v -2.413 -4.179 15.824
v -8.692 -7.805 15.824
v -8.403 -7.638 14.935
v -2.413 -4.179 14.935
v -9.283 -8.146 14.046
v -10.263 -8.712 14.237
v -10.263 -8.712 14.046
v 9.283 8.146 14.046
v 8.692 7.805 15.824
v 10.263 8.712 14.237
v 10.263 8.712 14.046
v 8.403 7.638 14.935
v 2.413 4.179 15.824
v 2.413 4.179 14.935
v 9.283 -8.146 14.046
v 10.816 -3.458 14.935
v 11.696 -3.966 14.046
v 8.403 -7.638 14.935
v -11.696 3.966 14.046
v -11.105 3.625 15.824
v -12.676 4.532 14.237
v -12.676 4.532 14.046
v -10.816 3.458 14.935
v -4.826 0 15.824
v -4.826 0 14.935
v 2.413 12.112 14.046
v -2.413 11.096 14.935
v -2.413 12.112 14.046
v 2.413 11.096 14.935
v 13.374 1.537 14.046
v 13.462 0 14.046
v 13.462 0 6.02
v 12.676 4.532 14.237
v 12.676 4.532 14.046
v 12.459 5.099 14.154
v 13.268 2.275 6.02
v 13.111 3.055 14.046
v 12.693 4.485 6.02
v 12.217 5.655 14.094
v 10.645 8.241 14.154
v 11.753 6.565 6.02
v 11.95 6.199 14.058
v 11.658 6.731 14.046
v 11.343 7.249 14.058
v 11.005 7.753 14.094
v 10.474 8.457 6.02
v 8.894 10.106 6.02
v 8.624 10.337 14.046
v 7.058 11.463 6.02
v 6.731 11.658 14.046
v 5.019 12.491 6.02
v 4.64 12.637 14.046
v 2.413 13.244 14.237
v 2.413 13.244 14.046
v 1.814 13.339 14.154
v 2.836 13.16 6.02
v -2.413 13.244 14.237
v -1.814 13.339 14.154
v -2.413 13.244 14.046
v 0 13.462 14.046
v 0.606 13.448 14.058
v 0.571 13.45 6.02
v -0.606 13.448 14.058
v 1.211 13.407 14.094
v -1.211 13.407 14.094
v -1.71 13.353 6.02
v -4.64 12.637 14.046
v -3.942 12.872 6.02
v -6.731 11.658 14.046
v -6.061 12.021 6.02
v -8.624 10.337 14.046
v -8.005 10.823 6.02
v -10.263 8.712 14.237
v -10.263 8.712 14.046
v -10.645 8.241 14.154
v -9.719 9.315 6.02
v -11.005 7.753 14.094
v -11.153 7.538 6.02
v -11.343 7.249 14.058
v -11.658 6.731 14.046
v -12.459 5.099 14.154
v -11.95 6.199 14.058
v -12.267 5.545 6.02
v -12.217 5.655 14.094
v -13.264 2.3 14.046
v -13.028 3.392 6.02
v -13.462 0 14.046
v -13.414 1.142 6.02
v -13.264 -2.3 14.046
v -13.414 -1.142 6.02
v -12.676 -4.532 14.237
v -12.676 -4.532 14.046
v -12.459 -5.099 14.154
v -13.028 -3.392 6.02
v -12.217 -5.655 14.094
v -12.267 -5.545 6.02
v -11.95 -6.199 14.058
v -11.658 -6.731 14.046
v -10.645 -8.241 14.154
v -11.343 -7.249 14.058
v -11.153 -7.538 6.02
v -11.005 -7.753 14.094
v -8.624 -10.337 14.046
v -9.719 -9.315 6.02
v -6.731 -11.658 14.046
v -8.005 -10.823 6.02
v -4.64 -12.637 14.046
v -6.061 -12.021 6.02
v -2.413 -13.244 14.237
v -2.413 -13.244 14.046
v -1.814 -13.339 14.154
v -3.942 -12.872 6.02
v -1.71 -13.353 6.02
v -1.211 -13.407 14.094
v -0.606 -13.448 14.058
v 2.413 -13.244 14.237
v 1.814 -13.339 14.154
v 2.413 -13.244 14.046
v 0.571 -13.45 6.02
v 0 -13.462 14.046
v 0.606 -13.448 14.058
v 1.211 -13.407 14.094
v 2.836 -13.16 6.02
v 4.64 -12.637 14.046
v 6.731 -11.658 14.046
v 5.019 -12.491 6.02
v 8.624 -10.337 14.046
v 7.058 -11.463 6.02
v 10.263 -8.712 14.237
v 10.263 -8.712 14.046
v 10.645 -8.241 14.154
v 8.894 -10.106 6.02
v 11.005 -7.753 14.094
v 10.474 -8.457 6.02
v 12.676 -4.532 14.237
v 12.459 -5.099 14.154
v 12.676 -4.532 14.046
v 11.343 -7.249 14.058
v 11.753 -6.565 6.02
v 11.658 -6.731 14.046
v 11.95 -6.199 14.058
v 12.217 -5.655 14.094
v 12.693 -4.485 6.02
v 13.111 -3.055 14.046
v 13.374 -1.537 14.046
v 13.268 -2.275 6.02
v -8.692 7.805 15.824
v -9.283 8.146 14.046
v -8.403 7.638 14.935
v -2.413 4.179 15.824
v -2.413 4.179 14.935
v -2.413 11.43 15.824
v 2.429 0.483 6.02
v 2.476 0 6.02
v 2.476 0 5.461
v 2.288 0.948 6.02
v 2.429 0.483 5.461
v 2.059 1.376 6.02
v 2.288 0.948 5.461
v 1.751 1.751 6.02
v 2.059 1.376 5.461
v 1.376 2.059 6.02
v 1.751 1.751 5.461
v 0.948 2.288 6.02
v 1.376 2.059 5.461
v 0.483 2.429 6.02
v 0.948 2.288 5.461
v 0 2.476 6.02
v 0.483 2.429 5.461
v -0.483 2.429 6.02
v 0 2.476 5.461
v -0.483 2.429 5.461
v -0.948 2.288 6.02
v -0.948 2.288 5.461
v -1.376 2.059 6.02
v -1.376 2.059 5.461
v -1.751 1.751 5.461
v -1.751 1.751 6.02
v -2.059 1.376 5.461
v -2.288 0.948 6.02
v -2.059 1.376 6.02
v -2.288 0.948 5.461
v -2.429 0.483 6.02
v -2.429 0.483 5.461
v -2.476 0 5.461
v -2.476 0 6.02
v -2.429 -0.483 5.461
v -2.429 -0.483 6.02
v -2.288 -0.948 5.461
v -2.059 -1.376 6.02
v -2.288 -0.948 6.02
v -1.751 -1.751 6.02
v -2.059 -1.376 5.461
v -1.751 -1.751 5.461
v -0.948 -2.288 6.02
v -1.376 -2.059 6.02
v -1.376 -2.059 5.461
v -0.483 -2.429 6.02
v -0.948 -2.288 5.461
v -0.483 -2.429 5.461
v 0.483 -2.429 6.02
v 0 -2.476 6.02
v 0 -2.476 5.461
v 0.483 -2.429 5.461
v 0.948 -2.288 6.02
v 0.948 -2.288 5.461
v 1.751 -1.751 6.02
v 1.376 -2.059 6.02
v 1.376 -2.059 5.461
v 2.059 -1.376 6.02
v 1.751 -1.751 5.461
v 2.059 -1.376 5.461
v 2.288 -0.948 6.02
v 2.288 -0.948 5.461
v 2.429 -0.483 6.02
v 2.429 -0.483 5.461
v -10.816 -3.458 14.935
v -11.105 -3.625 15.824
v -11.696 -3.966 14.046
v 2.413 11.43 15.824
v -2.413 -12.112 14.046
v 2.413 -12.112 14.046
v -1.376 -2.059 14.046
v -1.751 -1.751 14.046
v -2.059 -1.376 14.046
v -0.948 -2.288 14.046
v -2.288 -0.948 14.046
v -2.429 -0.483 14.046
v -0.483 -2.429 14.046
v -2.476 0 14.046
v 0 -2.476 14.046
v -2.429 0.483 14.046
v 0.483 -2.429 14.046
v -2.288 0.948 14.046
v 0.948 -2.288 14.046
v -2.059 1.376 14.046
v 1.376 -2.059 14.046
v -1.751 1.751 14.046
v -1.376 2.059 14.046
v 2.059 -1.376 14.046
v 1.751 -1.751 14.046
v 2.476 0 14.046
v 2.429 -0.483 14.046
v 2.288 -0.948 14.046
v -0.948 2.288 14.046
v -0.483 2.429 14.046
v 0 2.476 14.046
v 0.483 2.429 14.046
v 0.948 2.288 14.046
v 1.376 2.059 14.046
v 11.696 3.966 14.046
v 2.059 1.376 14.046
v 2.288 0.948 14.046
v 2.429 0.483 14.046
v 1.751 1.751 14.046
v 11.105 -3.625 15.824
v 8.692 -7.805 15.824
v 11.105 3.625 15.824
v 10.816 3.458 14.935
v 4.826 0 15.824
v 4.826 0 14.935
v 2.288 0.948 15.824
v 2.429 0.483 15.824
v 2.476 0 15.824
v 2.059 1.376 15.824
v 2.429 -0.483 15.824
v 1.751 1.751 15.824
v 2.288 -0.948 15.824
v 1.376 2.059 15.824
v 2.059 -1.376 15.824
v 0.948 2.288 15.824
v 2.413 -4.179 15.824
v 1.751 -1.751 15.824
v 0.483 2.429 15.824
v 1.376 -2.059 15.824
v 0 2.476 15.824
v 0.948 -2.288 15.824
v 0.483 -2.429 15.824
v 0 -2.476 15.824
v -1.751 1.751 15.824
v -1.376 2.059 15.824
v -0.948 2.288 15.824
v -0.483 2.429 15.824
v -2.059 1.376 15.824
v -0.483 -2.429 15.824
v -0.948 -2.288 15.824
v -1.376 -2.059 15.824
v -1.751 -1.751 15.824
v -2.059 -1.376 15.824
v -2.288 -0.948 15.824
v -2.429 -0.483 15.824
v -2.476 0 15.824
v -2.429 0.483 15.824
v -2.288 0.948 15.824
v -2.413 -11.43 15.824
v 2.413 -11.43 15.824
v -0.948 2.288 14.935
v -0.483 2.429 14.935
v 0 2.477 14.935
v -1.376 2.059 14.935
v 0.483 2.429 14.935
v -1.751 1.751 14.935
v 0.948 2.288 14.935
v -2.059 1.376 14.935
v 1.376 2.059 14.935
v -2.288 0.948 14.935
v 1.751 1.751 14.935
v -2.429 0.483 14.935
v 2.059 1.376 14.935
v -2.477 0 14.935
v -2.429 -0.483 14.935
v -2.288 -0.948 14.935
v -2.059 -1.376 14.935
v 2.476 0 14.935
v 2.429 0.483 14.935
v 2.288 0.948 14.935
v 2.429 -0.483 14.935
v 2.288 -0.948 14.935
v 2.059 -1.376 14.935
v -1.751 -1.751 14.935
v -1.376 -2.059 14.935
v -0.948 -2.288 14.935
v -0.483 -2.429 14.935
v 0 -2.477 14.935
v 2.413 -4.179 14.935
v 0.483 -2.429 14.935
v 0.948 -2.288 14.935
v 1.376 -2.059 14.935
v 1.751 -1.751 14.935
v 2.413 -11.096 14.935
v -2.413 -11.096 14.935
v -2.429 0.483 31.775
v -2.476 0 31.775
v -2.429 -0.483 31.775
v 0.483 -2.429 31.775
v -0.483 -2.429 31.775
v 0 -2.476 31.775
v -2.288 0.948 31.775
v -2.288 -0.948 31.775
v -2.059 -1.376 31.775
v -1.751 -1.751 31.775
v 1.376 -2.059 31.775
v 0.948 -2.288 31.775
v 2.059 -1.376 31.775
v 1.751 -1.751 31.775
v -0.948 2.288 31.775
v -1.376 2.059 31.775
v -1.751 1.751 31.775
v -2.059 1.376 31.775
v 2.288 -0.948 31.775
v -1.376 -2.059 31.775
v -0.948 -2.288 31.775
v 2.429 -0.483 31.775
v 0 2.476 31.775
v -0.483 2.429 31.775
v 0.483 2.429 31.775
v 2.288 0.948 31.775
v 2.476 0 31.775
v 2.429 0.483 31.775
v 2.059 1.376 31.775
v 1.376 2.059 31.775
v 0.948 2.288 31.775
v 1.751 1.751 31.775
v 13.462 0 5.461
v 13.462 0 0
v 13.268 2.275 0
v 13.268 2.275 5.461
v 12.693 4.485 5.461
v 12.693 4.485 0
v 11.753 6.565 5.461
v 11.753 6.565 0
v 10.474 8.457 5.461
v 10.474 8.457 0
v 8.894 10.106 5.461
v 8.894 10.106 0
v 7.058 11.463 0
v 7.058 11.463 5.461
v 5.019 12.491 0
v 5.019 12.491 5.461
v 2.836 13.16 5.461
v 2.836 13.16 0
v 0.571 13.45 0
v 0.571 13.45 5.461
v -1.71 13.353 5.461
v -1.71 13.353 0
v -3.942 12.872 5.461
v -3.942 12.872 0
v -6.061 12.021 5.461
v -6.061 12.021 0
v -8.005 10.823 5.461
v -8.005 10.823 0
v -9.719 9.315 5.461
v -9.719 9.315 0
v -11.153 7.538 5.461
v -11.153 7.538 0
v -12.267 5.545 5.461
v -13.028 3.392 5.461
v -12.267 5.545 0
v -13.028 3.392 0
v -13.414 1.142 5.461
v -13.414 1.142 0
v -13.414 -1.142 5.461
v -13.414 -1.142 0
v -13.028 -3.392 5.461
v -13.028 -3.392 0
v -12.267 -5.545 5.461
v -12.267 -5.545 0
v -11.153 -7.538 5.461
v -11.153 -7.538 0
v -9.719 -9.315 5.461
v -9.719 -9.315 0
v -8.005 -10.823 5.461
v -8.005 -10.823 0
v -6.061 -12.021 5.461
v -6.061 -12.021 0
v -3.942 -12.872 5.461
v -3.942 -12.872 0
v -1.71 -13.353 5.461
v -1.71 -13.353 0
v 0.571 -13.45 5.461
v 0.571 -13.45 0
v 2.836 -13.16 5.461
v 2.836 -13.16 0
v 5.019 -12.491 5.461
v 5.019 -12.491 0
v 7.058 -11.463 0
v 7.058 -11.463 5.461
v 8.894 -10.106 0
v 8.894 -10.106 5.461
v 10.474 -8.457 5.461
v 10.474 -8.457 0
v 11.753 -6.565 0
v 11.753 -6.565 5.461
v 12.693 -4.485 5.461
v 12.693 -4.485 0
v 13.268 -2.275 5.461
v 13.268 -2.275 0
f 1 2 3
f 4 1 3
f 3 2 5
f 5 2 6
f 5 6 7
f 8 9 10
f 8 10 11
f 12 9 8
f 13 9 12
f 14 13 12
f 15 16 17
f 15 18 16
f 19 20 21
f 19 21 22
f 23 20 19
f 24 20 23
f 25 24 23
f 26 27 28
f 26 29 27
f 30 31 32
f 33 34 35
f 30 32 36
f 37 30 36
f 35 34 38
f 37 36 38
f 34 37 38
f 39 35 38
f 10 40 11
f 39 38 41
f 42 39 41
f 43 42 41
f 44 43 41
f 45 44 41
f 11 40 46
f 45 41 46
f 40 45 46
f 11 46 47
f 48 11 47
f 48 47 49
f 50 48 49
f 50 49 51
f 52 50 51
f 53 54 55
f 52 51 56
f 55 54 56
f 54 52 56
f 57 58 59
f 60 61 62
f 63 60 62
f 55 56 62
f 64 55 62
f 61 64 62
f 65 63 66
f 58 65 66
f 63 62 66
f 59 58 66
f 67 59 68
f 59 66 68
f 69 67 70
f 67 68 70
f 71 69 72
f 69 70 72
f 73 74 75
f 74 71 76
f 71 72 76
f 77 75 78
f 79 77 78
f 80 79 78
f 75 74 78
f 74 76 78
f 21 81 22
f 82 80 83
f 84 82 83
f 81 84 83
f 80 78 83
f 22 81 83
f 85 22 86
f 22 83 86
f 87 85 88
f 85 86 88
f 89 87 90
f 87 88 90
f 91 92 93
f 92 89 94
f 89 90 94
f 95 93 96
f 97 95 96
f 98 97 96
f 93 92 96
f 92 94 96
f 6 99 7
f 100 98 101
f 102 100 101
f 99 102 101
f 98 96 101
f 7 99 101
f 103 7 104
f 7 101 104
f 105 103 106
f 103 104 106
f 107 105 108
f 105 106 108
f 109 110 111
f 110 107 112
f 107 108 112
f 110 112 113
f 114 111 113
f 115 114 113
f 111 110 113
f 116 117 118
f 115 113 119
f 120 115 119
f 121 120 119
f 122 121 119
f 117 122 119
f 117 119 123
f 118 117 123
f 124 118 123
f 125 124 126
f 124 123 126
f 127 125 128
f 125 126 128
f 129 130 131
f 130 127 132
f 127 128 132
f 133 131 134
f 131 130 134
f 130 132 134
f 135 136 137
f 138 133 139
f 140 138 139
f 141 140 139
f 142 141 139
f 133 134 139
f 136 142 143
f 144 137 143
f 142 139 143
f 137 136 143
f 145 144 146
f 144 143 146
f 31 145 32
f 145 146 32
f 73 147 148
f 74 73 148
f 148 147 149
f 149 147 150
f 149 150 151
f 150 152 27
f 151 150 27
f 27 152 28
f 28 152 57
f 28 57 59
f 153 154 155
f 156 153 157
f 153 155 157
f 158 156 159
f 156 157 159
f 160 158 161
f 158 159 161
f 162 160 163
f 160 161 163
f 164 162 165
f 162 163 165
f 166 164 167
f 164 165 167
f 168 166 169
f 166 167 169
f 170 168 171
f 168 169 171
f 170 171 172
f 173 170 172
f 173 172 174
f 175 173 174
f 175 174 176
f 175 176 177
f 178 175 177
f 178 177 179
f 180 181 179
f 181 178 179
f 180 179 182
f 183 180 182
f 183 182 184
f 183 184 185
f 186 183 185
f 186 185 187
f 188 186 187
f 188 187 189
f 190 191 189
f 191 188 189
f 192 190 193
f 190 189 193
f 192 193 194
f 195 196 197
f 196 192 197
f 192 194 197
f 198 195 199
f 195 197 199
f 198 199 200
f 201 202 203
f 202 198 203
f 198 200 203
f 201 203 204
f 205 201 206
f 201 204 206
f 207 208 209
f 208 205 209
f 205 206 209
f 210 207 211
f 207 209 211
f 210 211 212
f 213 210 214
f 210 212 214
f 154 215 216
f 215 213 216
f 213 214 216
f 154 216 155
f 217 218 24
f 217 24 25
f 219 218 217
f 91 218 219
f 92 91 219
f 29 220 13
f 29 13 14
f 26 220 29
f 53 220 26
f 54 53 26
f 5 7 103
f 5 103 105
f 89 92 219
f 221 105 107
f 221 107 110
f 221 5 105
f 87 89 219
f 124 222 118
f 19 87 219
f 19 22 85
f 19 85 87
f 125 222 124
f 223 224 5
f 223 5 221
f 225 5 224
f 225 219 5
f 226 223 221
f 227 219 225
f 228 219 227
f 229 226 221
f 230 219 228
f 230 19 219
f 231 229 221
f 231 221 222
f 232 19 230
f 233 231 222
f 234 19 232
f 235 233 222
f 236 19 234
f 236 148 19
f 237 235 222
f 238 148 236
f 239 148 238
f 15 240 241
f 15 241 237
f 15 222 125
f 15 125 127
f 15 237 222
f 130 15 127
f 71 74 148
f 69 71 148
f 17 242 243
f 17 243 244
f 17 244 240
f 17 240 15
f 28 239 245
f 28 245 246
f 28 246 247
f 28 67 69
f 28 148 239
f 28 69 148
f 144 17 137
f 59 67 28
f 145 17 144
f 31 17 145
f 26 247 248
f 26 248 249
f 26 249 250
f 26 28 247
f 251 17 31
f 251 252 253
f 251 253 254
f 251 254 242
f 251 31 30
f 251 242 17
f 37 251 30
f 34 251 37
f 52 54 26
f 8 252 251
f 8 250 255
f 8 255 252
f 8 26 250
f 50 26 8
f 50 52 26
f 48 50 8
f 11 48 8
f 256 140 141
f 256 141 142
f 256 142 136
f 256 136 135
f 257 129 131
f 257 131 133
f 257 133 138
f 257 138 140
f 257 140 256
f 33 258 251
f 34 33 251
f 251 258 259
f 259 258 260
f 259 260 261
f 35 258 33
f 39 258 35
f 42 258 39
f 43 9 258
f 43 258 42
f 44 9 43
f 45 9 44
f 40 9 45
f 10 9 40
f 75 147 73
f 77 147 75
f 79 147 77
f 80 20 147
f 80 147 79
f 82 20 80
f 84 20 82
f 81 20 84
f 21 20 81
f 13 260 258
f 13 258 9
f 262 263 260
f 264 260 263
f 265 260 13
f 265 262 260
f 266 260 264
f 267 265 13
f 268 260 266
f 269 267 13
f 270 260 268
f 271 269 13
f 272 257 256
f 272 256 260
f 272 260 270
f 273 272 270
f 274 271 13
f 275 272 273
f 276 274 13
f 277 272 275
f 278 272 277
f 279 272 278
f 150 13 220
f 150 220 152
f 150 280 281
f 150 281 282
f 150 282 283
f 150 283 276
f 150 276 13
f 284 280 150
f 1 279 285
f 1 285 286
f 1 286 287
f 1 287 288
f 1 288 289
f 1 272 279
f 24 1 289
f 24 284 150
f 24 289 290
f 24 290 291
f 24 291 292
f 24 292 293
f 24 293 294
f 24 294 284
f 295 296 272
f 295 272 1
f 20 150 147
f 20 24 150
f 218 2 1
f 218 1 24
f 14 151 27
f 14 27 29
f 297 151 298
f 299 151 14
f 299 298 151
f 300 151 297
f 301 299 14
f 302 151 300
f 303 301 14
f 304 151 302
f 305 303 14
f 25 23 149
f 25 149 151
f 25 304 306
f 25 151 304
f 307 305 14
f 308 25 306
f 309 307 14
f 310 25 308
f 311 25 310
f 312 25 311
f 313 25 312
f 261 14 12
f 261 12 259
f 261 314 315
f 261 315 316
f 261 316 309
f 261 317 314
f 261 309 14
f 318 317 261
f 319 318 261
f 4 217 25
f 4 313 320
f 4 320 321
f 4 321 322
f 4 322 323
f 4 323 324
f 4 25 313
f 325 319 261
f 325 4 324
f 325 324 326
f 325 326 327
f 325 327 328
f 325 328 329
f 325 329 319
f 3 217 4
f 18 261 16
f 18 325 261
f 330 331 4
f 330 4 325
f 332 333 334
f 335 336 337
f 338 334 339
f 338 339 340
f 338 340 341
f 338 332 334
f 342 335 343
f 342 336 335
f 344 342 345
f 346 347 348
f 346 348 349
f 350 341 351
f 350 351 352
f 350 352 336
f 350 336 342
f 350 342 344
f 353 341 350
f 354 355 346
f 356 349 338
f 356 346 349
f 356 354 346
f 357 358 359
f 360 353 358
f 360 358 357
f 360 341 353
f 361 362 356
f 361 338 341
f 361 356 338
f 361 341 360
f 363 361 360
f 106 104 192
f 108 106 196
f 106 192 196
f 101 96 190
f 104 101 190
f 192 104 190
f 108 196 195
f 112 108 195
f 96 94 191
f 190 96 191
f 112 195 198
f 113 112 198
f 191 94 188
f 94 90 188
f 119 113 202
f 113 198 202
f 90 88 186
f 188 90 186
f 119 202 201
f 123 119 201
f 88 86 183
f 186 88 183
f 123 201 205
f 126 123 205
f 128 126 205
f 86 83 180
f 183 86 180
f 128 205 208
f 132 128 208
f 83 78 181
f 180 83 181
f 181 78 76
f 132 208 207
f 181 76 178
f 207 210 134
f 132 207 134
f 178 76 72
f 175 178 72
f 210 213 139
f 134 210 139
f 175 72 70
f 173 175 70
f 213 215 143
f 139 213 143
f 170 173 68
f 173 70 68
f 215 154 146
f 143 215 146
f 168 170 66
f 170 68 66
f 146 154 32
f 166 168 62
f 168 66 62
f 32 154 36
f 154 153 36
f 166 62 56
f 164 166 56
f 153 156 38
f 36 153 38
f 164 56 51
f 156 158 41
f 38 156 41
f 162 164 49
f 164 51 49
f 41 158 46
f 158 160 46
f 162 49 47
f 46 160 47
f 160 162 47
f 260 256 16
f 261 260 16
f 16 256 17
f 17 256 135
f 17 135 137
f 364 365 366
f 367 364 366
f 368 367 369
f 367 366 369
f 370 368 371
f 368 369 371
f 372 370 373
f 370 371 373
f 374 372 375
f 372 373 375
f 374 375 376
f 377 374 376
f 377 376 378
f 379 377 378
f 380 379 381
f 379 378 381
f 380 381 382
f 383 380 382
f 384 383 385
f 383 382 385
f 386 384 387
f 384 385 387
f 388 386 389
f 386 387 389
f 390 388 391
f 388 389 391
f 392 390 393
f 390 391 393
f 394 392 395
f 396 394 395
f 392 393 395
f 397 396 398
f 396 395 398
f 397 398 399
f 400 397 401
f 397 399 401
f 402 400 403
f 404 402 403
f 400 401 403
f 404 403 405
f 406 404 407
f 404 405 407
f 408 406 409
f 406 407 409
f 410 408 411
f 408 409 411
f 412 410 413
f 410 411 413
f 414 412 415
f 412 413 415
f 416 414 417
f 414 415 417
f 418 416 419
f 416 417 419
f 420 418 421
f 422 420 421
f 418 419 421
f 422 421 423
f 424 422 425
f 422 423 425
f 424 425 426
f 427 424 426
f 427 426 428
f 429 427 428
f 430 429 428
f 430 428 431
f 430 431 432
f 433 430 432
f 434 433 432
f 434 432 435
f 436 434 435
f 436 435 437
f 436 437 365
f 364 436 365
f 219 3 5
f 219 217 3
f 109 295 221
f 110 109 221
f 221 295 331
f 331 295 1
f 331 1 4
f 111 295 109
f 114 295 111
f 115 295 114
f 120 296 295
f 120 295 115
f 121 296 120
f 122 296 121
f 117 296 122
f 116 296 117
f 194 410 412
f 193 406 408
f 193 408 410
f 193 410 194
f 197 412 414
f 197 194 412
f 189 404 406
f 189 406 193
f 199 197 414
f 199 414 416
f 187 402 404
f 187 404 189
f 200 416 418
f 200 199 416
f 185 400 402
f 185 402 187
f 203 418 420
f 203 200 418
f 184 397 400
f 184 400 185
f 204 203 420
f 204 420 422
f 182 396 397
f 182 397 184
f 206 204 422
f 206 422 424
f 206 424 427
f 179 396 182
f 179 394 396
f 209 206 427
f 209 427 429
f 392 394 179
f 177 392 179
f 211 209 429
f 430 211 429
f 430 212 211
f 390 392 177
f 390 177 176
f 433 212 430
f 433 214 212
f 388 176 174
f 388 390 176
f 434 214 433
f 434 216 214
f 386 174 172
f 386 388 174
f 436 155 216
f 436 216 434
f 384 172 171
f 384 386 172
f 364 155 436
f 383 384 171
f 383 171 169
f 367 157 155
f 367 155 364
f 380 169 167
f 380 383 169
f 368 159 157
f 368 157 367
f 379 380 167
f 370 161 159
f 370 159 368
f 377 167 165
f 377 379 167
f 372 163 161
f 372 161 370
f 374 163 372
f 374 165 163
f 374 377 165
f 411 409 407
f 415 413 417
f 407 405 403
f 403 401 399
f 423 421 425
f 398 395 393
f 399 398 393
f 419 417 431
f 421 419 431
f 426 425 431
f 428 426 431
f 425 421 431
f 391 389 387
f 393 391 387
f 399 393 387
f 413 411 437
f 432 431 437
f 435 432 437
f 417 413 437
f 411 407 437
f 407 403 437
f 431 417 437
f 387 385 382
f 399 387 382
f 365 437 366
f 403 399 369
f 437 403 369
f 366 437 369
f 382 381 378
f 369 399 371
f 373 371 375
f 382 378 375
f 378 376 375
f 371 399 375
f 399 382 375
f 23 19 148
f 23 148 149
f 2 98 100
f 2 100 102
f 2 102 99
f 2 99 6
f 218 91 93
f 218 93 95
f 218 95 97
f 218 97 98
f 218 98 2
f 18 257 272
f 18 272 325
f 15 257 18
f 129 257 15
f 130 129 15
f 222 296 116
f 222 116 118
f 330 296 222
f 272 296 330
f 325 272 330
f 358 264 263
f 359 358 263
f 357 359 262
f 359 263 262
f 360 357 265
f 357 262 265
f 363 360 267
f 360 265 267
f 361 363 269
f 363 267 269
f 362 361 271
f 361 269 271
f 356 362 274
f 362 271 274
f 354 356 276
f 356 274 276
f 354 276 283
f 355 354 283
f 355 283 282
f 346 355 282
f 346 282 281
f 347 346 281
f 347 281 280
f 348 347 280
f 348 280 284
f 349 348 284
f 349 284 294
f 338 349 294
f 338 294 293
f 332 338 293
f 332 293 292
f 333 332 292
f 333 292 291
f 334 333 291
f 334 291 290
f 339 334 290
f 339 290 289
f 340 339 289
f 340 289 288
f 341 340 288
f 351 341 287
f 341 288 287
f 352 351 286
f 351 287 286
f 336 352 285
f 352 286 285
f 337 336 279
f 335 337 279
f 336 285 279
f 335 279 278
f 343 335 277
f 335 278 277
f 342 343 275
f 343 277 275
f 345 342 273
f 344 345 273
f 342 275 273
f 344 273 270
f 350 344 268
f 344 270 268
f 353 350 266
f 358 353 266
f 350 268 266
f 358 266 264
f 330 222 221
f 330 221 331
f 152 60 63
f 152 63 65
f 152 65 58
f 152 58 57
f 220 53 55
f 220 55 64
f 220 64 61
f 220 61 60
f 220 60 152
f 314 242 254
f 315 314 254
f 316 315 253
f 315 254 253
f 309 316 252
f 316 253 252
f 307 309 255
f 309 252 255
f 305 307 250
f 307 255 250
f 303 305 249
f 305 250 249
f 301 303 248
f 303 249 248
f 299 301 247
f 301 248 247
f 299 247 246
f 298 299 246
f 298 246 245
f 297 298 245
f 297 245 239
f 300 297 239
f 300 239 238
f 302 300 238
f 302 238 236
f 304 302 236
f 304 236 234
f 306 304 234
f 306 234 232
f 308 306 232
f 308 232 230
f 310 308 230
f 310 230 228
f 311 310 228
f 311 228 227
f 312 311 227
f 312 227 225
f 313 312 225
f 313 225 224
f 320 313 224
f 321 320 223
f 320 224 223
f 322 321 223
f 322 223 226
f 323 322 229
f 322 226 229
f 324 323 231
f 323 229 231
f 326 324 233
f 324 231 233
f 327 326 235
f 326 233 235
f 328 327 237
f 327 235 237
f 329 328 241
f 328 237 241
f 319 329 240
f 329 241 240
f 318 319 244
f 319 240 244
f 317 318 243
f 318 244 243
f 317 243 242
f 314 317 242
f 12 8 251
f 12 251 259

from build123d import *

# Parameters (mm, degrees)
SKETCH1_R           = 13.462
BOSS_EXTRUDE1_DEPTH = 5.461
SKETCH2_R           = 2.4765
BOSS_EXTRUDE2_DEPTH = 26.3144
SKETCH3_R           = 13.462
BOSS_EXTRUDE3_DEPTH = 8.0264
BOSS_EXTRUDE4_DEPTH = 2.413
CIRPATTERN1_COUNT   = 3
SKETCH5_R           = 15.79013095
SKETCH5_R_2         = 13.462
CUT_EXTRUDE1_DEPTH  = 0.190772


with BuildPart() as part:
    # Sketch1 → Boss-Extrude1 (new body)
    with BuildSketch(Plane.XY):
        Circle(SKETCH1_R)
    extrude(amount=BOSS_EXTRUDE1_DEPTH)

    # Sketch2 → Boss-Extrude2 (add)
    with BuildSketch(Plane.XY.offset(5.461)):
        Circle(SKETCH2_R)
    extrude(amount=BOSS_EXTRUDE2_DEPTH)

    # Sketch3 → Boss-Extrude3 (add)
    with BuildSketch(Plane.XY.offset(6.0198)):
        Circle(SKETCH3_R)
    extrude(amount=BOSS_EXTRUDE3_DEPTH)

    # Sketch4 → Boss-Extrude4 (add, symmetric)
    with BuildSketch(Plane(origin=(0, 0, 0), x_dir=(0, 0, -1), z_dir=(1, 0, 0))):
        Polygon((-14.0462, 13.462), (-15.8242, 11.43), (-15.8242, -11.43), (-14.0462, -13.462), (-14.0462, -12.111971482), (-14.9352, -11.095971482), (-14.9352, 11.095971482), (-14.0462, 12.111971482), align=None)
    boss_extrude4 = extrude(amount=BOSS_EXTRUDE4_DEPTH, both=True)

    # CirPattern1: Boss-Extrude4 ×3 about axis
    cirpattern1_axis = Axis((0, 0, 0), (0, 0, 1))
    for i in range(1, CIRPATTERN1_COUNT):
        add(boss_extrude4.rotate(cirpattern1_axis, i * 360 / CIRPATTERN1_COUNT))

    # Sketch5 → Cut-Extrude1 (cut)
    with BuildSketch(Plane.XY.offset(14.0462)):
        Circle(SKETCH5_R)
        Circle(SKETCH5_R_2, mode=Mode.SUBTRACT)
    extrude(amount=CUT_EXTRUDE1_DEPTH, mode=Mode.SUBTRACT)


solid = part.part
